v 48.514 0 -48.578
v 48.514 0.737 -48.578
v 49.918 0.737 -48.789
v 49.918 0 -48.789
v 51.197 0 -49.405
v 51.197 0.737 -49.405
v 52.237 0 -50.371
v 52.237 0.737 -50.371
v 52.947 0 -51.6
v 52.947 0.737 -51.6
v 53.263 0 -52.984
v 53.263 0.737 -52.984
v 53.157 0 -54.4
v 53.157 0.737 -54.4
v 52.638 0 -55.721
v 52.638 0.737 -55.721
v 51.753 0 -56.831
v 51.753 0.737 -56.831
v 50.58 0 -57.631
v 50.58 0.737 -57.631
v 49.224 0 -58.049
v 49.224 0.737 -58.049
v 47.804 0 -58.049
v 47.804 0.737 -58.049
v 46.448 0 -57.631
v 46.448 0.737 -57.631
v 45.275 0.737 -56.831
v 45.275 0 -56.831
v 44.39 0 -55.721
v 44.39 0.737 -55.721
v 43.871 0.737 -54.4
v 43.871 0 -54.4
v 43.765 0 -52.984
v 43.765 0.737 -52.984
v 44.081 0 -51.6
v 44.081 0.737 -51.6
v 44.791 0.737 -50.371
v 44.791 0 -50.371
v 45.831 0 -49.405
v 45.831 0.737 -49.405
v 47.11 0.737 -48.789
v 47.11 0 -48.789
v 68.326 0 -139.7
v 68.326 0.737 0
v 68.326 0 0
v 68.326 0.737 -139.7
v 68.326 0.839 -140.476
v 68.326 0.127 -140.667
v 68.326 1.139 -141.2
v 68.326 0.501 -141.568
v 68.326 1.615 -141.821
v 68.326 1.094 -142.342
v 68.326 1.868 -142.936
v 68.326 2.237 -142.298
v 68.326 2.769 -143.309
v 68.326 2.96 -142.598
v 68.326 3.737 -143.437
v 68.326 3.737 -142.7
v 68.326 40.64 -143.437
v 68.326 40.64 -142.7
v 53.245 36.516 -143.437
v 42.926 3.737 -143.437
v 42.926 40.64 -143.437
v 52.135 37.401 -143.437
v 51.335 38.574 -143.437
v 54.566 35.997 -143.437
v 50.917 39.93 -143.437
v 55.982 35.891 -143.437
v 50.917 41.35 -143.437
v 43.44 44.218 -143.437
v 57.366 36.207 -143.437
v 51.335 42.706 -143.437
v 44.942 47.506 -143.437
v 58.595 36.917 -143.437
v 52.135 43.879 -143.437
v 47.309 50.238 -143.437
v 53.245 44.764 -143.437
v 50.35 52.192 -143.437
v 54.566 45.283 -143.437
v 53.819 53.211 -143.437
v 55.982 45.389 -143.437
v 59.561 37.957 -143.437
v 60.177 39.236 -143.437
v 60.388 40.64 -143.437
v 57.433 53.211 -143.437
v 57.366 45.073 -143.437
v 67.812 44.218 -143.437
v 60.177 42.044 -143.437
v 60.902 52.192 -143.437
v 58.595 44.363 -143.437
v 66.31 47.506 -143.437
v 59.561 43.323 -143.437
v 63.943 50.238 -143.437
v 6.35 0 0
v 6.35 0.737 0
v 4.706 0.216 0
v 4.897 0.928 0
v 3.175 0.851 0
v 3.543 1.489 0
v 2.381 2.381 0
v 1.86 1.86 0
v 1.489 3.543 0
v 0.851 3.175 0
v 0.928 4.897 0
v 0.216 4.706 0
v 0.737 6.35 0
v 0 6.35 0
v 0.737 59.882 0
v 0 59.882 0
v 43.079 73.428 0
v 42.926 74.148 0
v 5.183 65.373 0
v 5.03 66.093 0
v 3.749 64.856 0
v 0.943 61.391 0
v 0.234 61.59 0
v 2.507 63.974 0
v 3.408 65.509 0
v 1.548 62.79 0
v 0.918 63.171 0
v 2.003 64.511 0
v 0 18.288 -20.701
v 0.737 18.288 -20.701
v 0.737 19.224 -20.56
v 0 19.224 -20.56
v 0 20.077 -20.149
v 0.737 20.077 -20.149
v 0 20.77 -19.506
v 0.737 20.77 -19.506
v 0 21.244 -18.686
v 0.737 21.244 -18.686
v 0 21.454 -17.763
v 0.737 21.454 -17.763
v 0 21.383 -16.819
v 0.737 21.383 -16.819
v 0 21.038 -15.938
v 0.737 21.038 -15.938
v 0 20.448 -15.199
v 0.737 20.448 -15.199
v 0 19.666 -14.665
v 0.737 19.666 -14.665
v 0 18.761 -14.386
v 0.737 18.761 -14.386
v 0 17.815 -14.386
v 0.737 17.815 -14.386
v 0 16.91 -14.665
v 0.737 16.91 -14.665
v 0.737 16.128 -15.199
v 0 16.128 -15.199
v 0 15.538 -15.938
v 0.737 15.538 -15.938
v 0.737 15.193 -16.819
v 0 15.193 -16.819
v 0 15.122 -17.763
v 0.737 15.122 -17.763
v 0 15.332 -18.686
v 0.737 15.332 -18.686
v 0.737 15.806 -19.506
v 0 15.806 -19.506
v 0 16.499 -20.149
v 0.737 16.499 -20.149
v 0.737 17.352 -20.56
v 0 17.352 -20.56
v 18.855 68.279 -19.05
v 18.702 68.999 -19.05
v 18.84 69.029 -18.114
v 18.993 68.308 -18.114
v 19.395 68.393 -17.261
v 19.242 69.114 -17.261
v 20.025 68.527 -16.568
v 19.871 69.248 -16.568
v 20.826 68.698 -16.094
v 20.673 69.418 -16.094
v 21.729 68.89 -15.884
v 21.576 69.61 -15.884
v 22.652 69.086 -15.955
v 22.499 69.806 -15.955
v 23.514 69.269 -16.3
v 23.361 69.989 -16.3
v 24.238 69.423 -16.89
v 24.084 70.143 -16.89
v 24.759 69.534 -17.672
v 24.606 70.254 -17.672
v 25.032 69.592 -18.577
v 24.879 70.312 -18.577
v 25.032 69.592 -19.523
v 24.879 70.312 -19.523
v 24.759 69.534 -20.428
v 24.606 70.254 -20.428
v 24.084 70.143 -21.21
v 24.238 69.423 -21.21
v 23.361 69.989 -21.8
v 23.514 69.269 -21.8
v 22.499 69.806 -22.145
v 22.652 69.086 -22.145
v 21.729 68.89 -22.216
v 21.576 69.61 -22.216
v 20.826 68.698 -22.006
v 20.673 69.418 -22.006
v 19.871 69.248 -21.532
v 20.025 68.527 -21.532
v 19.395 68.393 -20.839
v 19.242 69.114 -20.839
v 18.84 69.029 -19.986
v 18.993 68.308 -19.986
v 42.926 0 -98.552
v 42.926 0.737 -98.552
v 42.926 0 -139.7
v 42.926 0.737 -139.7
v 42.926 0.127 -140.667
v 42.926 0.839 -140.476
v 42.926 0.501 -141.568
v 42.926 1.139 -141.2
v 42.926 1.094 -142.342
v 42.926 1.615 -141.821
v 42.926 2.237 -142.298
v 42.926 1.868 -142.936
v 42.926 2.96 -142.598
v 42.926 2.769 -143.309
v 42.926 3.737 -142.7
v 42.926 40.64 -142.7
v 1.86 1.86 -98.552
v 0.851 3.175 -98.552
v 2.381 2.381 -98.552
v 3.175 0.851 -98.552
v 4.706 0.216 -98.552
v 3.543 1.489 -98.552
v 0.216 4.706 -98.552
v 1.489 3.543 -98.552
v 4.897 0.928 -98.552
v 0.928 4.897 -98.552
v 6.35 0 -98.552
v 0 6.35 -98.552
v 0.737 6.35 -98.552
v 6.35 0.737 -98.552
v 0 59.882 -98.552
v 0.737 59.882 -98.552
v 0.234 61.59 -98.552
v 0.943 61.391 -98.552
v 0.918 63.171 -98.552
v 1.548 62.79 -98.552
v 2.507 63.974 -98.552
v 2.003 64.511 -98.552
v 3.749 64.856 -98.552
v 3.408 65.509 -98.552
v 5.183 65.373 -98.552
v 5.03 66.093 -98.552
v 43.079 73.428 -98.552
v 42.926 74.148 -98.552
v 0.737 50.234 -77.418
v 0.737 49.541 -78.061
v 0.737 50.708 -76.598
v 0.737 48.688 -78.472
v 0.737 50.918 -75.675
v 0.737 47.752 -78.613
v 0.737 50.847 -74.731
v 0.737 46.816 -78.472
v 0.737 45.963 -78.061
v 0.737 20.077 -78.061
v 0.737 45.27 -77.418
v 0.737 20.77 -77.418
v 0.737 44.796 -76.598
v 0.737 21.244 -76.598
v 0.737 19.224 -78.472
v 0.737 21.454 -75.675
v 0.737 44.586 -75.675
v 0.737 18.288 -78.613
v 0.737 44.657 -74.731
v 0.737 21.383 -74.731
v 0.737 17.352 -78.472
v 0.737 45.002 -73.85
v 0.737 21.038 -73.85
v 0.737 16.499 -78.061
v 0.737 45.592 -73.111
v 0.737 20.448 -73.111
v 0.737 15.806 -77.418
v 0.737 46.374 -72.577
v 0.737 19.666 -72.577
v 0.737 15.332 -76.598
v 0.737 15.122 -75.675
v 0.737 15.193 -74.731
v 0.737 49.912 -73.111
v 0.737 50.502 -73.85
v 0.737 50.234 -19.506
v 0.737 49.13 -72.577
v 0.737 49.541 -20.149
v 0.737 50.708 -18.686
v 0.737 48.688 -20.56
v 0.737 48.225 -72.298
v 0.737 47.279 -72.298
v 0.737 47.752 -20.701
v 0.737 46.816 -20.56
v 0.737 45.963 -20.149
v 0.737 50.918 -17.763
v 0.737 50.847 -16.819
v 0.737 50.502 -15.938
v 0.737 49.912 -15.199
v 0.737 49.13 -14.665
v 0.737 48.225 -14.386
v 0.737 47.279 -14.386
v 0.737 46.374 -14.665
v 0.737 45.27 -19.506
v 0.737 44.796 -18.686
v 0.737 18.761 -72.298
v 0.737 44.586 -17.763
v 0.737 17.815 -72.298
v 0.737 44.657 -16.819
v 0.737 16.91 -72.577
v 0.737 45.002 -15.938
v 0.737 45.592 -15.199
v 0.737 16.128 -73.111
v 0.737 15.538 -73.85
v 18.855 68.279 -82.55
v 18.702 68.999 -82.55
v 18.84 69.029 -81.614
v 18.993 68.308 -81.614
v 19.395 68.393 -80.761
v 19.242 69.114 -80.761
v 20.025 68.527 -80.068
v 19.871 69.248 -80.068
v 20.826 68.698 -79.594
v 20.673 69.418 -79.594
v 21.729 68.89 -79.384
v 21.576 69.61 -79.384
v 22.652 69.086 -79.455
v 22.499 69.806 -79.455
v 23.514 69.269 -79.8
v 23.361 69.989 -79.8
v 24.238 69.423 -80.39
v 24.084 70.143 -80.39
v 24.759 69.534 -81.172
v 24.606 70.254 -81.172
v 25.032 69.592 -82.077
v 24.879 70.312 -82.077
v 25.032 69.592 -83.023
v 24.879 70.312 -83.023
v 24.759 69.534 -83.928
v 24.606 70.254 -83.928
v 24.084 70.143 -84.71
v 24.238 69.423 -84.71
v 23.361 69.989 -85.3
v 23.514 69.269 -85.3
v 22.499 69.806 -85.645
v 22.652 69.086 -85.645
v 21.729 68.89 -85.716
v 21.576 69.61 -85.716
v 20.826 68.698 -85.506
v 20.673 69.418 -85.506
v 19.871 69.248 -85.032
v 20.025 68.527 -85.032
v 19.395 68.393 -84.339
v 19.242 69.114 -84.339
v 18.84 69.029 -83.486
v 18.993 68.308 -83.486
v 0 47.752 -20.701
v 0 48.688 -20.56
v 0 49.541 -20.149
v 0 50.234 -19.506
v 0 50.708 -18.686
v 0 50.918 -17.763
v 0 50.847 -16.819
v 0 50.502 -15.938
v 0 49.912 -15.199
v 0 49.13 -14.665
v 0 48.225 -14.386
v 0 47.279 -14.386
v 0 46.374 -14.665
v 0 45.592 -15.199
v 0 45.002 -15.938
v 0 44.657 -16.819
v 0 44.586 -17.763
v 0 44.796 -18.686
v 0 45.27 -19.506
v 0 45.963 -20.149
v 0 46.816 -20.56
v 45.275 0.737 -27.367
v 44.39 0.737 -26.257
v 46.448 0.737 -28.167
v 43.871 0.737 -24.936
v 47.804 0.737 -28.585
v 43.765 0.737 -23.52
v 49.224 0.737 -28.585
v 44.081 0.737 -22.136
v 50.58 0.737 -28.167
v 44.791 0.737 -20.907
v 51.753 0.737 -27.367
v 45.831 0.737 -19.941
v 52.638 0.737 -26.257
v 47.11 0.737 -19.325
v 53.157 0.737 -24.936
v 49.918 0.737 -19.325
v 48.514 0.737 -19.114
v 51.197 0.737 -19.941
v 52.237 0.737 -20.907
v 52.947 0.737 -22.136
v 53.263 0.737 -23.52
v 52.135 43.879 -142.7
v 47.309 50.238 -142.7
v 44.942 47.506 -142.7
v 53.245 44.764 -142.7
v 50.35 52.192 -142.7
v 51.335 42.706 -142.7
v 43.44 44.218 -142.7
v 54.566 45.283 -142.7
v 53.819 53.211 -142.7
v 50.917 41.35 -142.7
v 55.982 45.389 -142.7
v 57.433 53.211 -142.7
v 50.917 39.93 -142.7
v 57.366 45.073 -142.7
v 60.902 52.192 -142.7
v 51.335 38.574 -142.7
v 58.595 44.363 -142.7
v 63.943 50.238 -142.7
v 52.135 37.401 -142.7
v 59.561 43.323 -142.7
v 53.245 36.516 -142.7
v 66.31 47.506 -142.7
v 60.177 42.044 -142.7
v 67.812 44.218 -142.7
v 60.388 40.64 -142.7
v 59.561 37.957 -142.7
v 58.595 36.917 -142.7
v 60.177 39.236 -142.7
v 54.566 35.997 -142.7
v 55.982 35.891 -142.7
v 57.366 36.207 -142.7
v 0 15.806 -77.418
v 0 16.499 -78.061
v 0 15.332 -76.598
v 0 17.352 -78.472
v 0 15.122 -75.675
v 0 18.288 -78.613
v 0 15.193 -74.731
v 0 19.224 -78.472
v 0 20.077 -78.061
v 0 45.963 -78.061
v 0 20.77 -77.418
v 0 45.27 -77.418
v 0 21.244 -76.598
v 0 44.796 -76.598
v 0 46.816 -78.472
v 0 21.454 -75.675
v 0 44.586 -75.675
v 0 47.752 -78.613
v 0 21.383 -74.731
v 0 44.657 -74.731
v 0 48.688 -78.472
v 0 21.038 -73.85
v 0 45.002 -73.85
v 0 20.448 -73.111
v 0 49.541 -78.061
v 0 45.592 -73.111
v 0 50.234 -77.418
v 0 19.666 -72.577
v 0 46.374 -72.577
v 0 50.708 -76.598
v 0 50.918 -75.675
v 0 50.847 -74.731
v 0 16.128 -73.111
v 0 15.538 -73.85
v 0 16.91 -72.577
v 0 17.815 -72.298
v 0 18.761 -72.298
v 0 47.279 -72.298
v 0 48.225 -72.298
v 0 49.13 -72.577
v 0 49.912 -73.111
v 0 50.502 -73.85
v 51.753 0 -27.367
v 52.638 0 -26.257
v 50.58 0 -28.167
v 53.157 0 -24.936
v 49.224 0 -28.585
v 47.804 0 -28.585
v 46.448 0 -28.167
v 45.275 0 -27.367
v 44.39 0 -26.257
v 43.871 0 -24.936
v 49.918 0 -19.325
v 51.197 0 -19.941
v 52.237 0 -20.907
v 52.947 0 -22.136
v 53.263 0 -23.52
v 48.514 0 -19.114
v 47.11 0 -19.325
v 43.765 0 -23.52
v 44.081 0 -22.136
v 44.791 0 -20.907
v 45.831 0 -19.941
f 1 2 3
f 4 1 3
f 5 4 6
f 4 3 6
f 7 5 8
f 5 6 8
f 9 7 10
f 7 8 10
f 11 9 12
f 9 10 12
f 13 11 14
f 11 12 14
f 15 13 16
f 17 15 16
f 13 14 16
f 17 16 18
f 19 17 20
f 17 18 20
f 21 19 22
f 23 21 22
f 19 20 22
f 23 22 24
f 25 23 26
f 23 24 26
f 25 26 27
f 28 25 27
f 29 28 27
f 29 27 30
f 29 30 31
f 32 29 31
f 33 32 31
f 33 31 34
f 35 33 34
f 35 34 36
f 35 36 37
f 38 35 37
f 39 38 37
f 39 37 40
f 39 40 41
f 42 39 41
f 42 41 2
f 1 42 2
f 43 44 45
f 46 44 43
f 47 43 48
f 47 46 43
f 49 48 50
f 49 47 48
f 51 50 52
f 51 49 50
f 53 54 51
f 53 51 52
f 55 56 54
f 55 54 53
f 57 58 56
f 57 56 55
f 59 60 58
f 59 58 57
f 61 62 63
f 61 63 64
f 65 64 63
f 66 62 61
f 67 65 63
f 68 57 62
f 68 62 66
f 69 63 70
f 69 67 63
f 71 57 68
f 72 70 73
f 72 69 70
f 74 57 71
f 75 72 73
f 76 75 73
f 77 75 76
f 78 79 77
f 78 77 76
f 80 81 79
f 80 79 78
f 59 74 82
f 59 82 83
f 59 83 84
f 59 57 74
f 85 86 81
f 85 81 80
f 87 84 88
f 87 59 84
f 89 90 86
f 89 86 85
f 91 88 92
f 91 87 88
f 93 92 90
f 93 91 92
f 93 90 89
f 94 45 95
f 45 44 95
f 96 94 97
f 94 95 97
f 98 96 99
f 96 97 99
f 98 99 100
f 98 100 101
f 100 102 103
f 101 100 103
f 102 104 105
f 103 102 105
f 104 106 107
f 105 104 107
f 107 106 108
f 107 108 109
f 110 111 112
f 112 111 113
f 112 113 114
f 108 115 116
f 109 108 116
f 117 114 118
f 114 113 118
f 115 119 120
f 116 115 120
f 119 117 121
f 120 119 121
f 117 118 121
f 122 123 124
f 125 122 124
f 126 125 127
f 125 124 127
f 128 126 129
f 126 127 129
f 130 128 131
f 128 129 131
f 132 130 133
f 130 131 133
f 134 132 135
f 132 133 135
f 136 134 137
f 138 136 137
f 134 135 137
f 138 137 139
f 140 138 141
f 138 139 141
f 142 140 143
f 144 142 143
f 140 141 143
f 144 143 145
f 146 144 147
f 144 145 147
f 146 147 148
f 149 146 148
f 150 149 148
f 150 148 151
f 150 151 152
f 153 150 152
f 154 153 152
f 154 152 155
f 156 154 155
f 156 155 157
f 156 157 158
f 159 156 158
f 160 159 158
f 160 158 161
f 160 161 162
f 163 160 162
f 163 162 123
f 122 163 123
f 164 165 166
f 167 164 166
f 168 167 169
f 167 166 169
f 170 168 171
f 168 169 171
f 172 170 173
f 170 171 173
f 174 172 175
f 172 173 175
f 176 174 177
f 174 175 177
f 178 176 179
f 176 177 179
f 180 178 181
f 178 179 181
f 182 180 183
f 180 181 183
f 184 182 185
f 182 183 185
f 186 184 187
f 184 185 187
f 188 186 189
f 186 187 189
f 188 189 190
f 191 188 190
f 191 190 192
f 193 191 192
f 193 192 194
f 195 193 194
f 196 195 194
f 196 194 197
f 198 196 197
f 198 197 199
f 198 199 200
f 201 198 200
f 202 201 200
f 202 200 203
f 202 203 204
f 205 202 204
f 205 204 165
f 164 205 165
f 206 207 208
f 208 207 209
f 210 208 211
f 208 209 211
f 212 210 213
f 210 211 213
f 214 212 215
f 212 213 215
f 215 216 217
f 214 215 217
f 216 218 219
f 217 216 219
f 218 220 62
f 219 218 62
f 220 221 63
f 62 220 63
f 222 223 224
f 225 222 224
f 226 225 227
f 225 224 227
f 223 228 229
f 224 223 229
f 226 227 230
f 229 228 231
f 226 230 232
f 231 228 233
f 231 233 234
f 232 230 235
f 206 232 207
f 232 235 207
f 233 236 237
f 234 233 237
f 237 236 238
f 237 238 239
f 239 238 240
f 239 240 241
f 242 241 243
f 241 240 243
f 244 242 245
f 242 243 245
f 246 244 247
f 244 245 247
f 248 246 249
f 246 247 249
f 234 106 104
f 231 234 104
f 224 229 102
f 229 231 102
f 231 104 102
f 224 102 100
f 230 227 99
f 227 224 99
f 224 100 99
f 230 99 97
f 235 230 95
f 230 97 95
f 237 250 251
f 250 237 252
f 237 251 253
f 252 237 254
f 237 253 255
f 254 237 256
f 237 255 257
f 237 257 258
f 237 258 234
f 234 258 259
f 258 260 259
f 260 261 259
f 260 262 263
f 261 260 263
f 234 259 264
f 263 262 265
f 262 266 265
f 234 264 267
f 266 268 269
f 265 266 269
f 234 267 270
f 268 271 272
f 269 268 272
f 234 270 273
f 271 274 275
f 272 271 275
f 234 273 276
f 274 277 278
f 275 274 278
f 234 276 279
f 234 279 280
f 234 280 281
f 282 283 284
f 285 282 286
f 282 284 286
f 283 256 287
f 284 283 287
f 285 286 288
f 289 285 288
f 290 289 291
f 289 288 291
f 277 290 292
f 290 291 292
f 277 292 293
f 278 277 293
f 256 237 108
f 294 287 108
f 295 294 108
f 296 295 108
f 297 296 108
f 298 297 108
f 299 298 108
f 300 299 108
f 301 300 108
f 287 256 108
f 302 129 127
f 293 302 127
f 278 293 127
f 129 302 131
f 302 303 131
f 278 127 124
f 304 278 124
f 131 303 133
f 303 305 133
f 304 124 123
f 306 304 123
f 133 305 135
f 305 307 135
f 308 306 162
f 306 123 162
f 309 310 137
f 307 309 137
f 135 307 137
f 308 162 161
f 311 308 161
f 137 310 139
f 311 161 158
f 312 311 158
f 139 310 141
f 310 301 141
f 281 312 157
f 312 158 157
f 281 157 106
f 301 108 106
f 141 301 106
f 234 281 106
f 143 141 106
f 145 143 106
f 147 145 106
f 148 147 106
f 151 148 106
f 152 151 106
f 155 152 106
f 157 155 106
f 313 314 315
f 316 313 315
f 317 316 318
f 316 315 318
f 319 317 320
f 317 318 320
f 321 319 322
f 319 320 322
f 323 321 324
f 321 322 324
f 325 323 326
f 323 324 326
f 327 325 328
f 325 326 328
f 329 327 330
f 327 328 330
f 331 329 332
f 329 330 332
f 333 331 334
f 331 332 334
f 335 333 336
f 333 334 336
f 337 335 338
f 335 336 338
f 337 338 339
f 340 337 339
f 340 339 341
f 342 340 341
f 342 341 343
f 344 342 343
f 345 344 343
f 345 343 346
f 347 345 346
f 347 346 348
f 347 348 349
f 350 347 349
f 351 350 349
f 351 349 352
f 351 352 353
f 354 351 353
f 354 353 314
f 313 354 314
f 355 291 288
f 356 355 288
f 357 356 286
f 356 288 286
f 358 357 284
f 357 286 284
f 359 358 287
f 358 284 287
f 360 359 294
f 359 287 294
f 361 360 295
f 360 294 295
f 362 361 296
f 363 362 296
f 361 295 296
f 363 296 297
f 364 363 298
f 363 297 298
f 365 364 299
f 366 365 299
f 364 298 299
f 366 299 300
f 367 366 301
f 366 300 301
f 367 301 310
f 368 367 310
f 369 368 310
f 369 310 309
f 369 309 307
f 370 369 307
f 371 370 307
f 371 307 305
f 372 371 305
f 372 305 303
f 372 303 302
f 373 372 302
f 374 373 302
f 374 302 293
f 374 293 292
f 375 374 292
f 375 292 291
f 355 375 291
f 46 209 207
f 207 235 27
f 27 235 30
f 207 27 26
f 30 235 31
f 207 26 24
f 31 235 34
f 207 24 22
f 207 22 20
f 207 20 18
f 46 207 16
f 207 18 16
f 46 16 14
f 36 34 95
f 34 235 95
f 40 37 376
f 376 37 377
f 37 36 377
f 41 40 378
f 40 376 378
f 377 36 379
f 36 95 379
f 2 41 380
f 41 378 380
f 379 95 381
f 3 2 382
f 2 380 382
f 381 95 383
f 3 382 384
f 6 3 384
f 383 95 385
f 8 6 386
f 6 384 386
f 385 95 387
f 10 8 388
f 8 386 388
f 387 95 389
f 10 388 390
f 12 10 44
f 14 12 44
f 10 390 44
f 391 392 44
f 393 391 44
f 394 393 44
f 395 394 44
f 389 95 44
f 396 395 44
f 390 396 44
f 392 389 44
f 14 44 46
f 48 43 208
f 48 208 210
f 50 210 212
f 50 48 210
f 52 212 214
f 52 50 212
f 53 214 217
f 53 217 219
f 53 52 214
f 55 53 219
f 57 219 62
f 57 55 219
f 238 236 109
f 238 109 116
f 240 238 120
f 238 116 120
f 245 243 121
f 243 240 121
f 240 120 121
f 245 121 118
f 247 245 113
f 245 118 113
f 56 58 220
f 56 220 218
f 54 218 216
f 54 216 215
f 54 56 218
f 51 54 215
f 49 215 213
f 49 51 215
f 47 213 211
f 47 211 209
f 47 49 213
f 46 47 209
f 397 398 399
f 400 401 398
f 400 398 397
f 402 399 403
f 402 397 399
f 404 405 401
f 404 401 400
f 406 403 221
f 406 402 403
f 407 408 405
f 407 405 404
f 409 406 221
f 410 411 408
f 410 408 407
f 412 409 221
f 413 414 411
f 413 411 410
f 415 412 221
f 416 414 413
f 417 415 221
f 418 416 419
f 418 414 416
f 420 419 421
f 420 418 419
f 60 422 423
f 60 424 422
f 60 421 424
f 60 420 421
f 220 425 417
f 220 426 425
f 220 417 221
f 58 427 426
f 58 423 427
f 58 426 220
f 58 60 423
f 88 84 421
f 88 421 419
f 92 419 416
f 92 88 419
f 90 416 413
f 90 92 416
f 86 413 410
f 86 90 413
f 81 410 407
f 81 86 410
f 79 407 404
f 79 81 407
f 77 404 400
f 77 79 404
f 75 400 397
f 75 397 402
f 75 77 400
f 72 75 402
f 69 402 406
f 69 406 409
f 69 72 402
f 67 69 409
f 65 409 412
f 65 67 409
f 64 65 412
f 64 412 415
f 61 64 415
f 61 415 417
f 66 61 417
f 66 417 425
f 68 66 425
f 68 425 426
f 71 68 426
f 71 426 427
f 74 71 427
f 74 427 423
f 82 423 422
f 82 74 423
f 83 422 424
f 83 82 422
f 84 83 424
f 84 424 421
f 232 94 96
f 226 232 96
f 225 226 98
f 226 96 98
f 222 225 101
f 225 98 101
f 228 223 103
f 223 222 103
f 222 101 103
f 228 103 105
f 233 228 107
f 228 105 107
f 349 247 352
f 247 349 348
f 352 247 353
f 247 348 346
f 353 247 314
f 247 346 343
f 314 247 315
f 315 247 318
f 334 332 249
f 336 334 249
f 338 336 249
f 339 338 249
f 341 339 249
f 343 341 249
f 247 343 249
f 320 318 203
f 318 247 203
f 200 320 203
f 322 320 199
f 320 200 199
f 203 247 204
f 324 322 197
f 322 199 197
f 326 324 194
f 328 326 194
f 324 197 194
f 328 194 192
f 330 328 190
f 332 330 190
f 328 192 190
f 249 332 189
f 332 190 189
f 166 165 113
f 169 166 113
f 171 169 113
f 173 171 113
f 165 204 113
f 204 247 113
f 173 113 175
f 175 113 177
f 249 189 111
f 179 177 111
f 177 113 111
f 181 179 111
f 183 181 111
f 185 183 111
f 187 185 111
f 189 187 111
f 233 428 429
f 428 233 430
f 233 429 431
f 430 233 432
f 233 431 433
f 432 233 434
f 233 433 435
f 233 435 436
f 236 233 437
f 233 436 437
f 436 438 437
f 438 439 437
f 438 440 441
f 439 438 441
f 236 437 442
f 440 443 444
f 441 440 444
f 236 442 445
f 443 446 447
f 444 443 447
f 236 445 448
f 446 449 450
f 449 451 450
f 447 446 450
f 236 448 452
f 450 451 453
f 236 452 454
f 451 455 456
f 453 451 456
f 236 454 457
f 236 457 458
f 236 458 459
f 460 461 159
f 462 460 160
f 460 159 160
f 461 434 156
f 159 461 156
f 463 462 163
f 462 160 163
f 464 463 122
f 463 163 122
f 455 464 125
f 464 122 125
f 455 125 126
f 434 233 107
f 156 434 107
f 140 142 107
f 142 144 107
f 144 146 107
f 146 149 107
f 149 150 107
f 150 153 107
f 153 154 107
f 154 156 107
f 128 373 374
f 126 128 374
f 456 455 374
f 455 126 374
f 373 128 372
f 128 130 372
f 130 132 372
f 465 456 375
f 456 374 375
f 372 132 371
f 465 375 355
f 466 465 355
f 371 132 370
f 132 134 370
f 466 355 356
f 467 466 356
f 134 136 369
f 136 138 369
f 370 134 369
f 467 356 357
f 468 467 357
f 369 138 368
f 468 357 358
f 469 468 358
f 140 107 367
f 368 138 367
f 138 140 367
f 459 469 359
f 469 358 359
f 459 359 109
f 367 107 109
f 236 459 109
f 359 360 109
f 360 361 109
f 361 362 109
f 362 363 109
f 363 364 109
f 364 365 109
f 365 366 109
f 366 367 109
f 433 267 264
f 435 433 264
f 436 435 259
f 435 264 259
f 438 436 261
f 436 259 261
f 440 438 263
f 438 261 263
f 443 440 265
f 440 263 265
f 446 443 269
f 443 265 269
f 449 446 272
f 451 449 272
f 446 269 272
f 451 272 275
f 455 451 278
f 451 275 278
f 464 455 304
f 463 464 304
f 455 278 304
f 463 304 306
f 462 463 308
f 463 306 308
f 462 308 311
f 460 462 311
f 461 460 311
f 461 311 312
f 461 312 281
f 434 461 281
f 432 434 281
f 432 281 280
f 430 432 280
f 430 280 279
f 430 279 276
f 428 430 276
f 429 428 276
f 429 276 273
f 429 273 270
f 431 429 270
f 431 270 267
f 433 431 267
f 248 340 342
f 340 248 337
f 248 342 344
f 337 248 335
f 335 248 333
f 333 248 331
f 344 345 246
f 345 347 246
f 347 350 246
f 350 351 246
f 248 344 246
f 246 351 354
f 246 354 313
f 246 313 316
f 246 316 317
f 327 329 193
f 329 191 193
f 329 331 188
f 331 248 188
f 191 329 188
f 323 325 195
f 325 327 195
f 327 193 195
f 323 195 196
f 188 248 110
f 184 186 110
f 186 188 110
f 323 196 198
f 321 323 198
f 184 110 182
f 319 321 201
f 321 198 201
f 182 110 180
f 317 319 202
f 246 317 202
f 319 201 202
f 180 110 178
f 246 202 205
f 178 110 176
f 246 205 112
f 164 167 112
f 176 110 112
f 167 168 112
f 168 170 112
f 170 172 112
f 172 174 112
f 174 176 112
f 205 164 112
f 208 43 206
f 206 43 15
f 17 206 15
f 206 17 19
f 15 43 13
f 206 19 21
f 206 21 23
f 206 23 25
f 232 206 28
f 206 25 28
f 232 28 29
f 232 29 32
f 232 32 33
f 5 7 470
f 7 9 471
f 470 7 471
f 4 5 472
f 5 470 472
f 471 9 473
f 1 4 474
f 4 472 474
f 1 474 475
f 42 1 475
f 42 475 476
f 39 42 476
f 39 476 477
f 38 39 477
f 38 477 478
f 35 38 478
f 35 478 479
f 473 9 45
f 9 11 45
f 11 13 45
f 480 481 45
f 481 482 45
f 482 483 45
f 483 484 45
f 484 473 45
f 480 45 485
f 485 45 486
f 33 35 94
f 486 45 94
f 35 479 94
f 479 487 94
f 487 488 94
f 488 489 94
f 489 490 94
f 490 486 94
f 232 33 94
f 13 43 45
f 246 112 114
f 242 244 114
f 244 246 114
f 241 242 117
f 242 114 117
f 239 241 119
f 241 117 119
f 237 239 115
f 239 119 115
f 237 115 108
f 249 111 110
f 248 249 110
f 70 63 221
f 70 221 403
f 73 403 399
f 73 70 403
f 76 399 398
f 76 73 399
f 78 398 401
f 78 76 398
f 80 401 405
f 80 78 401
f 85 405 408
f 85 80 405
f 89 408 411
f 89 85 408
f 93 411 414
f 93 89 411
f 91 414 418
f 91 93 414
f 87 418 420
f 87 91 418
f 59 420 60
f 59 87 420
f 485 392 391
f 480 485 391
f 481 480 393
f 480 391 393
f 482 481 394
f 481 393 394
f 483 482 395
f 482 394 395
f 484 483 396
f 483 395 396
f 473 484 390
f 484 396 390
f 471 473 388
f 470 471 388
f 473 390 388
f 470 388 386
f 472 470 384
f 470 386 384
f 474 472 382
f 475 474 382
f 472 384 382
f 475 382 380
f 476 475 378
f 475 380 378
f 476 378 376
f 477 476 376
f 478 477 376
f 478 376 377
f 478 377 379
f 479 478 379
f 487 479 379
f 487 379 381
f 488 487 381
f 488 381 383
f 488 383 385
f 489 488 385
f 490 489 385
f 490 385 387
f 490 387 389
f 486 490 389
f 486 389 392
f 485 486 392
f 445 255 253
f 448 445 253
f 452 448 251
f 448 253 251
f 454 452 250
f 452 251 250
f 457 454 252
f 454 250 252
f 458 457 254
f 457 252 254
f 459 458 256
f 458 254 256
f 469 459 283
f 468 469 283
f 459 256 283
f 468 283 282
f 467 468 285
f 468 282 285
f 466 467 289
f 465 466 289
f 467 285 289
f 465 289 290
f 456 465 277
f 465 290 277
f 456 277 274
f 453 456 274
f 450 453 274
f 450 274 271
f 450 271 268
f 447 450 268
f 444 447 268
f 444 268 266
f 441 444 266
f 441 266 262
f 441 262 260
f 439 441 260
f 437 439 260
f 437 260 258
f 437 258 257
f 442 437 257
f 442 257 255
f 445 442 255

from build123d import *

# Parameters (mm, degrees)
BASE_FLANGE1_DEPTH = 139.7
CUT_EXTRUDE1_START = -139.7
CUT_EXTRUDE1_DEPTH = 41.148
EDGE_FLANGE1_DEPTH = 25.4
FILLET1_RADIUS     = 12.7
FILLET1_LENGTH     = 0.7366
HOLE1_START        = -143.4366
HOLE1_OUTLINE_R    = 4.7625
HOLE1_DEPTH        = 0.7366
SKETCH34_R         = 3.175
CUT_EXTRUDE2_DEPTH = 2.54
SKETCH35_R         = 4.7625
CUT_EXTRUDE3_DEPTH = 2.54
SKETCH36_R         = 3.175
CUT_EXTRUDE4_DEPTH = 2.54


# Read off the part's stored shape, not the designer's step: Cut-Extrude1, Hole1
# Sheet-metal steps are written as plain solids
with BuildPart() as part:
    # Sketch1 → Base-Flange1 (new body)
    with BuildSketch(Plane.XY):
        with BuildLine():
            Line((68.326, 0), (6.35, 0))
            ThreePointArc((6.35, 0), (1.859871939, 1.859871939), (0, 6.35))
            Line((0, 6.35), (0, 59.881871389))
            ThreePointArc((0, 59.881871389), (1.415123145, 63.878055872), (5.029760763, 66.093108654))
            Line((5.029760763, 66.093108654), (42.926, 74.148202966))
            Line((42.926, 74.148202966), (43.079147751, 73.427699444))
            Line((43.079147751, 73.427699444), (5.182908515, 65.372605131))
            ThreePointArc((5.182908515, 65.372605131), (1.98756886, 63.414498472), (0.7366, 59.881871389))
            Line((0.7366, 59.881871389), (0.7366, 6.35))
            ThreePointArc((0.7366, 6.35), (2.380726794, 2.380726794), (6.35, 0.7366))
            Line((6.35, 0.7366), (68.326, 0.7366))
            Line((68.326, 0.7366), (68.326, 0))
        make_face()
    extrude(amount=-BASE_FLANGE1_DEPTH)

    # Cut-Extrude1 outline → Cut-Extrude1 (cut)
    with BuildSketch(Plane.XY.offset(CUT_EXTRUDE1_START)):
        with BuildLine():
            Line((6.35, 0), (42.926, 0))
            Line((42.926, 0), (42.926, 0.7366))
            Line((42.926, 0.7366), (6.35, 0.7366))
            ThreePointArc((6.35, 0.7366), (2.380726794, 2.380726794), (0.7366, 6.35))
            Line((0.7366, 6.35), (0.7366, 59.881871389))
            ThreePointArc((0.7366, 59.881871389), (1.98756886, 63.414498472), (5.182908515, 65.372605131))
            Line((5.182908515, 65.372605131), (43.079147751, 73.427699444))
            Line((43.079147751, 73.427699444), (42.926, 74.148202966))
            Line((42.926, 74.148202966), (5.029760763, 66.093108654))
            ThreePointArc((5.029760763, 66.093108654), (1.415123145, 63.878055872), (0, 59.881871389))
            Line((0, 59.881871389), (0, 6.35))
            ThreePointArc((0, 6.35), (1.859871939, 1.859871939), (6.35, 0))
        make_face()
    extrude(amount=CUT_EXTRUDE1_DEPTH, mode=Mode.SUBTRACT)

    # Edge-Flange1 section (across the edge) → Edge-Flange1 (add)
    with BuildSketch(Plane(origin=(68.326, 0.7366, -142.7), x_dir=(0, 0, 1), z_dir=(-1, 0, 0))):
        with BuildLine():
            Line((-0.7366, 3), (-0.7366, 52.6034))
            Line((-0.7366, 52.6034), (0, 52.6034))
            Line((0, 52.6034), (0, 3))
            ThreePointArc((0, 3), (0.878679656, 0.878679656), (3, 0))
            Line((3, 0), (3, -0.7366))
            ThreePointArc((3, -0.7366), (0.357824801, 0.357824801), (-0.7366, 3))
        make_face()
    extrude(amount=EDGE_FLANGE1_DEPTH)

    # Fillet1: full round fillet: the end face becomes a half cylinder, R = half its width
    fillet1_face = Plane((55.626, 53.34, -143.0683), x_dir=(0, 0, -1), z_dir=(0, 1, 0))  # on the end face: x along it, z out of the body
    fillet1_slab = fillet1_face.offset(-FILLET1_RADIUS / 2) * Box(FILLET1_LENGTH, 2 * FILLET1_RADIUS, FILLET1_RADIUS, mode=Mode.PRIVATE)  # the body's end, R deep
    fillet1_round = Plane((55.626, 40.64, -143.0683), x_dir=(0, 1, 0), z_dir=(0, 0, -1)) * Cylinder(FILLET1_RADIUS, FILLET1_LENGTH, mode=Mode.PRIVATE)  # its axis R under the face
    add(fillet1_slab - fillet1_round, mode=Mode.SUBTRACT)

    # Hole1 outline → Hole1 (cut)
    with BuildSketch(Plane.XY.offset(HOLE1_START)):
        with Locations((55.626, 40.64)):
            Circle(HOLE1_OUTLINE_R)
    extrude(amount=HOLE1_DEPTH, mode=Mode.SUBTRACT)

    # Sketch34 → Cut-Extrude2 (cut)
    with BuildSketch(Plane(origin=(-13.22382174, 62.213189919, 0), x_dir=(0.9781476007338064, 0.20791169081775657, 0), z_dir=(-0.20791169081775657, 0.9781476007338064, 0))):
        with Locations(Location((35.814242159, 19.05, 0), (0, 0, 180))):
            Circle(SKETCH34_R)
        with Locations(Location((35.814242159, 82.55, 0), (0, 0, 180))):
            Circle(SKETCH34_R)
    extrude(amount=-CUT_EXTRUDE2_DEPTH, mode=Mode.SUBTRACT)

    # Sketch35 → Cut-Extrude3 (cut)
    with BuildSketch(Plane(origin=(0, 0.7366, 0), x_dir=(1, 0, 0), z_dir=(0, 1, 0))):
        with Locations(Location((48.514, 23.876, 0), (0, 0, 270))):
            Circle(SKETCH35_R)
        with Locations(Location((48.514, 53.34, 0), (0, 0, 270))):
            Circle(SKETCH35_R)
    extrude(amount=-CUT_EXTRUDE3_DEPTH, mode=Mode.SUBTRACT)

    # Sketch36 → Cut-Extrude4 (cut)
    with BuildSketch(Plane(origin=(0.7366, 0, 0), x_dir=(0, 0, -1), z_dir=(1, 0, 0))):
        with Locations((17.526, 18.288)):
            Circle(SKETCH36_R)
        with Locations((75.438, 18.288)):
            Circle(SKETCH36_R)
        with Locations((17.526, 47.752)):
            Circle(SKETCH36_R)
        with Locations((75.438, 47.752)):
            Circle(SKETCH36_R)
    extrude(amount=-CUT_EXTRUDE4_DEPTH, mode=Mode.SUBTRACT)


solid = part.part
